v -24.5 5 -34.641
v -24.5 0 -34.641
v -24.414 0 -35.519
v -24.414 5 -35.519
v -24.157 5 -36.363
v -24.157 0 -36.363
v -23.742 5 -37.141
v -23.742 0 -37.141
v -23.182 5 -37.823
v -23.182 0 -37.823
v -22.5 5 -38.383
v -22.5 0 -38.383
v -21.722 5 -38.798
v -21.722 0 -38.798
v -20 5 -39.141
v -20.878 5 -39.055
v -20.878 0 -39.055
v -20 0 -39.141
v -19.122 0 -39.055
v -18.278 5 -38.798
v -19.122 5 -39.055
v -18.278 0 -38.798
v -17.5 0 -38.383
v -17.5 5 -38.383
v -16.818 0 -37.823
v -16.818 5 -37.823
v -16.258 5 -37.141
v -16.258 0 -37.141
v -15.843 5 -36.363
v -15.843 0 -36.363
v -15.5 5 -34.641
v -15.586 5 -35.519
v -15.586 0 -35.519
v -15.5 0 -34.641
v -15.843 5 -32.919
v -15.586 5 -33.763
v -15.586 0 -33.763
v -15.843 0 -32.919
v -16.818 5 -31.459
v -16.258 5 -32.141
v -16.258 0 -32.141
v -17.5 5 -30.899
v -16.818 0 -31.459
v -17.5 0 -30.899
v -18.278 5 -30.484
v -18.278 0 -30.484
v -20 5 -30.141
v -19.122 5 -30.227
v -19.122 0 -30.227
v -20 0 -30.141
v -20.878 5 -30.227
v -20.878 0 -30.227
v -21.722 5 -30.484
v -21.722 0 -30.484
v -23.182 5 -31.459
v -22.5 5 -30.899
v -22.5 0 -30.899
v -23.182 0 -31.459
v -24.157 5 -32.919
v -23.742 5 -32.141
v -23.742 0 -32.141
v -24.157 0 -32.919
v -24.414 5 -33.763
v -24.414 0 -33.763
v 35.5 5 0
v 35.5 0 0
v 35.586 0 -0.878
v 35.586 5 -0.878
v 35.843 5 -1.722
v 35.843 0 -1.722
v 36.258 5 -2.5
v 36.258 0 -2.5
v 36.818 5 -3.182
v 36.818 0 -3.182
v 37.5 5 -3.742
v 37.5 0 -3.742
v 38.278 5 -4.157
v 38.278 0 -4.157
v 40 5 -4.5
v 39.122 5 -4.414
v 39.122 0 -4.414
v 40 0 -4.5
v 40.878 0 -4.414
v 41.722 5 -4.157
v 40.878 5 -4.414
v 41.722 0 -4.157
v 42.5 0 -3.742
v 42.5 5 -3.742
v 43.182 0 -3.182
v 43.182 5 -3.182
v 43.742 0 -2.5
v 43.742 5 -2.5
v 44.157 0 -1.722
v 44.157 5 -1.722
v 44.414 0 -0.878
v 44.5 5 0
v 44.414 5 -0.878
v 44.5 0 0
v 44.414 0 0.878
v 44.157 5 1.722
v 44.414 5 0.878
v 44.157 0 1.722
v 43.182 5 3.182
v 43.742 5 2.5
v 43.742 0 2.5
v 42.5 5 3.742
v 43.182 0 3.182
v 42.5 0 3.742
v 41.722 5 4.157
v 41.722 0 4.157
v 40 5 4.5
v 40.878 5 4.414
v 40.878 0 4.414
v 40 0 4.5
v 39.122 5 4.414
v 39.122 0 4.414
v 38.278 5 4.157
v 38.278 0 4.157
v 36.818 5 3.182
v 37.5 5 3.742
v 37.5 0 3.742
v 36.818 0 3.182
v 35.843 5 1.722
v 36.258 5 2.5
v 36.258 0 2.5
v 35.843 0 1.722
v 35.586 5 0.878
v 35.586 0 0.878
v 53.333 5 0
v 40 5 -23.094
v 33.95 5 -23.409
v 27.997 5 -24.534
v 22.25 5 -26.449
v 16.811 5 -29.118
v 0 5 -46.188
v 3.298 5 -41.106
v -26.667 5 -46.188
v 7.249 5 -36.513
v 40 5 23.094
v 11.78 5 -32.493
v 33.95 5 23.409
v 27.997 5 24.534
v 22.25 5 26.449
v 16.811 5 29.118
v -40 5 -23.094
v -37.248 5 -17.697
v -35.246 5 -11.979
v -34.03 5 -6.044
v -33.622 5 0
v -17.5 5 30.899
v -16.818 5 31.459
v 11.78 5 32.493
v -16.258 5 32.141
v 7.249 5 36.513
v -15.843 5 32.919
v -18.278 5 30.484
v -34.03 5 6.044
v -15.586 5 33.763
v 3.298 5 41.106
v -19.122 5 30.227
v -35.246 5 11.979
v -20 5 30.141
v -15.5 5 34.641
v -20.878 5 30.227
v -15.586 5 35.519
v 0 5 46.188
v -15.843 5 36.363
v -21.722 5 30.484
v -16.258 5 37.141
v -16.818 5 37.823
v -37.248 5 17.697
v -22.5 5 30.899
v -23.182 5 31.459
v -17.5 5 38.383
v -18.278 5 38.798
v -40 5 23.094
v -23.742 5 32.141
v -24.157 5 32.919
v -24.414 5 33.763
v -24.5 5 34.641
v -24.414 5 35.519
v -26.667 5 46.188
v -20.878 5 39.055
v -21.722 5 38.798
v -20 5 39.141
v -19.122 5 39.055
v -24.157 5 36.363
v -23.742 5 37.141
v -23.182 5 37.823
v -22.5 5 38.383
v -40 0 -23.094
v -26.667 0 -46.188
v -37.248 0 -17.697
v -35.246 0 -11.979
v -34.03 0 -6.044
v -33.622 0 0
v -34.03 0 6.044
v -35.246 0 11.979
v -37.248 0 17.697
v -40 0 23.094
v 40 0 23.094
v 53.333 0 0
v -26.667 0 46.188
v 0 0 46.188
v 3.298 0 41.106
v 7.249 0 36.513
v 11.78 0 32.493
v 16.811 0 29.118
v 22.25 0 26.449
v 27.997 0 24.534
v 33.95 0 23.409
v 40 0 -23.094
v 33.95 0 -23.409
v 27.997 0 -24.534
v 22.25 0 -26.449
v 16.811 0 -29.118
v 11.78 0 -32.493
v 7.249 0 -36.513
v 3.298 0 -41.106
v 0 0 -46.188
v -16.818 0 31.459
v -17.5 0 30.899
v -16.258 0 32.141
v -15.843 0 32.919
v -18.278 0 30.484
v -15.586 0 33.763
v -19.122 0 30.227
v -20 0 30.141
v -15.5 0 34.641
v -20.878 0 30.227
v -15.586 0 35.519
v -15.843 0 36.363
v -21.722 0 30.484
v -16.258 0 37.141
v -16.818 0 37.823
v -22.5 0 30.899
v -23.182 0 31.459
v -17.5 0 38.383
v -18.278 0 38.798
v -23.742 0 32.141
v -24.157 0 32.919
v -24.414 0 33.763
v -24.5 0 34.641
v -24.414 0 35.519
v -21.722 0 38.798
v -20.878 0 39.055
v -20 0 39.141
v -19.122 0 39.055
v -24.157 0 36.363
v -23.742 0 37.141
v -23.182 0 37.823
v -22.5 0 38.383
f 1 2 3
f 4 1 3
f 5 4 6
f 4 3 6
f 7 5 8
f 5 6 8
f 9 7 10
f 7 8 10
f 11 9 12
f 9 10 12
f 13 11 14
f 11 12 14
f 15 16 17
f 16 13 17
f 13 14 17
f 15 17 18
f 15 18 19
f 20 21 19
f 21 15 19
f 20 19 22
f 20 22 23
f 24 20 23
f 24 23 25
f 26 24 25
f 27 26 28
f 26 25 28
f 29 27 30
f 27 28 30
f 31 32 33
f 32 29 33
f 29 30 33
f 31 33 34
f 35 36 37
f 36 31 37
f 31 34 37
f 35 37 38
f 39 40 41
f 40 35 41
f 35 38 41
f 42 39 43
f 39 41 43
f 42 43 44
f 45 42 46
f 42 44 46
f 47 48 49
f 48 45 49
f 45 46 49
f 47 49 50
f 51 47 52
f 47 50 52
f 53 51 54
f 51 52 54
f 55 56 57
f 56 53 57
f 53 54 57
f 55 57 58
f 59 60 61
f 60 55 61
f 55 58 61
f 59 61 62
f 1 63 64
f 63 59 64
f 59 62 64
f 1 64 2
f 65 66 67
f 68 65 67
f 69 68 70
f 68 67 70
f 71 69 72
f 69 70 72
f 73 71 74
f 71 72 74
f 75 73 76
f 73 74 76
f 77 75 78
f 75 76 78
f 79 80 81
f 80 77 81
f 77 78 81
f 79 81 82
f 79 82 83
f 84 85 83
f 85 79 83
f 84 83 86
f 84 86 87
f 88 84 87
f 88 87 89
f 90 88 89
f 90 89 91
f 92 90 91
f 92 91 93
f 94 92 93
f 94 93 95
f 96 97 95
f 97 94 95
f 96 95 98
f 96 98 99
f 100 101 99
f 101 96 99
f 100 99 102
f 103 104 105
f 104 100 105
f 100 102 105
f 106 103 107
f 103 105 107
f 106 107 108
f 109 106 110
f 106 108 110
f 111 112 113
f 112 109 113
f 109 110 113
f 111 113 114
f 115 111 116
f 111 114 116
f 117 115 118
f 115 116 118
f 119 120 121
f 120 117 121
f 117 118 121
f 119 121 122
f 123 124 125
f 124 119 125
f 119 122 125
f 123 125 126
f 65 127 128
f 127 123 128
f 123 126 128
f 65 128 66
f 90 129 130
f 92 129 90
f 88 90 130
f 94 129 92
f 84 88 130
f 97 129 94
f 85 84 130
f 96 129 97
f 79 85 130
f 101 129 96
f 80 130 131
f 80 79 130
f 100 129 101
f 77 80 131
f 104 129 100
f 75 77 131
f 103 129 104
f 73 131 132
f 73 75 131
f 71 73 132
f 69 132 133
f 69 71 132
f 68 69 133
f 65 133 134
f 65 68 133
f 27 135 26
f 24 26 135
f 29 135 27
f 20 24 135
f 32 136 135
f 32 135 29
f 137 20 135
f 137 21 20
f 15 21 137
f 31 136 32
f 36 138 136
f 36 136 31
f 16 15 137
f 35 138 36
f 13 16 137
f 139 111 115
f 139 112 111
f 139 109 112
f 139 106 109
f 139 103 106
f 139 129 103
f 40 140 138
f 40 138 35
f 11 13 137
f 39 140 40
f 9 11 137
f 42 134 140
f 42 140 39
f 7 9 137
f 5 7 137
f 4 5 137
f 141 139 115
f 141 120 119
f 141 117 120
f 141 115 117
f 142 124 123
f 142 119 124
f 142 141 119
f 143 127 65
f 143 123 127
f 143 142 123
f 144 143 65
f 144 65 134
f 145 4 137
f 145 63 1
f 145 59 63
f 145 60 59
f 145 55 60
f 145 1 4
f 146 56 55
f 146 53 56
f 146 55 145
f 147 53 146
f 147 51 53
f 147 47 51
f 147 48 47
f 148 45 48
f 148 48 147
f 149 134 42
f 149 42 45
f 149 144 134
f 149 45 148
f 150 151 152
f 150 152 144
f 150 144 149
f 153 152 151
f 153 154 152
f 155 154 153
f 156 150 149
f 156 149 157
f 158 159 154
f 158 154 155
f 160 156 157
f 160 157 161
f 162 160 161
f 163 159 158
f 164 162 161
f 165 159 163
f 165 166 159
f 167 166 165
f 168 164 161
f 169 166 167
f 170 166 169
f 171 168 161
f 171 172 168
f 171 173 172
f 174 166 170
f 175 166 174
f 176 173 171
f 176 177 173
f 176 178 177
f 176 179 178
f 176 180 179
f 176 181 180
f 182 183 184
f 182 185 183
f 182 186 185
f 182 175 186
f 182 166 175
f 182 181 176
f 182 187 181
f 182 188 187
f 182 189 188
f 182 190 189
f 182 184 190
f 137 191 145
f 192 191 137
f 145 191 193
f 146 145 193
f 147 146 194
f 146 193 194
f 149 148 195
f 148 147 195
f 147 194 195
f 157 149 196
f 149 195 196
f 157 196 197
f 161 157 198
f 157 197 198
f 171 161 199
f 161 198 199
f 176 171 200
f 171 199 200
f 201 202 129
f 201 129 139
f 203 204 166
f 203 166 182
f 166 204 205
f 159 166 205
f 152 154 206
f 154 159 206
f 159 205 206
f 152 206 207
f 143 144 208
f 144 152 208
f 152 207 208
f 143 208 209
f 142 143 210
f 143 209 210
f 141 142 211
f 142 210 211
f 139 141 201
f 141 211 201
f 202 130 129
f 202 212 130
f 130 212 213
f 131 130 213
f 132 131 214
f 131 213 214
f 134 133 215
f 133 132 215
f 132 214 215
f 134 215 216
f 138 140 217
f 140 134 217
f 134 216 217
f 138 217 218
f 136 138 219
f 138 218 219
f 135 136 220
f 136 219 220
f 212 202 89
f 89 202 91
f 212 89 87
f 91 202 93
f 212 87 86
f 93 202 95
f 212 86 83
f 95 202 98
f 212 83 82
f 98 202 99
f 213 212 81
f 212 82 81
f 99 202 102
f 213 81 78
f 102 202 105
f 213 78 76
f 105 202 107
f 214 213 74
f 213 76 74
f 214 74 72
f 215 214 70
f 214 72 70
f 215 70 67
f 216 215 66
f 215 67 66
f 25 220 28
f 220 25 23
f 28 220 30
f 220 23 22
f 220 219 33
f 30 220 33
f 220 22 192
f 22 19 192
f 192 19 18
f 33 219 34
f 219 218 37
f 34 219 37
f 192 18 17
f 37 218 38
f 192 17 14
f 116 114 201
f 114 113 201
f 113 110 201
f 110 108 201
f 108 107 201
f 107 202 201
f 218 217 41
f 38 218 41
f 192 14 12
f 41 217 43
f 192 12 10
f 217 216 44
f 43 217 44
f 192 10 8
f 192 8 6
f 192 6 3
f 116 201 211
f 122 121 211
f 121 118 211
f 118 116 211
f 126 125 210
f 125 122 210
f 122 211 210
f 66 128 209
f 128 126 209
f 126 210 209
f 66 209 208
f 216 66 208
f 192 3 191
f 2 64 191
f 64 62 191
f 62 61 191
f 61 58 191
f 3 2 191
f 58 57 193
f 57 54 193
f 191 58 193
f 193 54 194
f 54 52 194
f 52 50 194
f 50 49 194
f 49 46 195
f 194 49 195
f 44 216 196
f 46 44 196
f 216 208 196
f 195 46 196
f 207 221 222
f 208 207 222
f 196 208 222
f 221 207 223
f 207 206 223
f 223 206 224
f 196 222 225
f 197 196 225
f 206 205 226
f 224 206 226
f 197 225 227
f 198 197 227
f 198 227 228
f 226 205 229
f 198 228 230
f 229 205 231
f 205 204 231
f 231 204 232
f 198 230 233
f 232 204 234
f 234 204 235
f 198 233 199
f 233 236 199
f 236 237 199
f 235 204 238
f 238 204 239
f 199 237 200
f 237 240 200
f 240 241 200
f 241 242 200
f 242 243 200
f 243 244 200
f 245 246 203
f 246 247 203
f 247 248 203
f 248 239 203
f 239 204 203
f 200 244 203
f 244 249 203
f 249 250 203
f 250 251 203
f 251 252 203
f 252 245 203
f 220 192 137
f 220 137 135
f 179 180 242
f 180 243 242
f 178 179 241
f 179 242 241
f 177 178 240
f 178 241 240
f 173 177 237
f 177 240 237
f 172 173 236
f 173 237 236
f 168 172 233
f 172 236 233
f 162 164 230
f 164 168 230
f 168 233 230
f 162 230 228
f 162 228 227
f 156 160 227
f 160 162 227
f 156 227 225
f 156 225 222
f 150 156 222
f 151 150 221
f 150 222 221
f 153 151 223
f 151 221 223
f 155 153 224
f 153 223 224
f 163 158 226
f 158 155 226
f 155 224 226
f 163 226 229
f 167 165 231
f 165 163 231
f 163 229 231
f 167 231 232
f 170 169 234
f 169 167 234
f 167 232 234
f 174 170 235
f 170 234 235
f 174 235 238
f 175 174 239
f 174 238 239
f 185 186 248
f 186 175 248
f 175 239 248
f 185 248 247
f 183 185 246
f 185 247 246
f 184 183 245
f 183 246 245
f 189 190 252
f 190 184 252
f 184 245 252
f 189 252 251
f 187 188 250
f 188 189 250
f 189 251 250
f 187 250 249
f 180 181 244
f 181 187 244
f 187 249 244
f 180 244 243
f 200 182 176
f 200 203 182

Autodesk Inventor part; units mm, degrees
ref_plane "YZ Plane" through (0, 0, 0) normal (1, 0, 0) x (0, 1, 0)
ref_plane "XZ Plane" through (0, 0, 0) normal (0, 1, 0) x (-1, 0, 0)
ref_plane "XY Plane" through (0, 0, 0) normal (0, 0, 1) x (1, 0, 0)
sketch "Sketch1" plane through (0, 0, 0) normal (0, 1, 0) x (-1, 0, 0)
  circle A0 centre (-40, 0) radius 4.5
  circle A1 centre (20, -34.641) radius 4.5
  circle A2 centre (20, 34.641) radius 4.5
  line L0 (40, -23.094) -> (26.6667, -46.188)
  line L1 (26.6667, -46.188) -> (0, -46.188)
  line L2 (-40, -23.094) -> (-53.3333, 0)
  line L3 (-53.3333, 0) -> (-40, 23.094)
  line L4 (0, 46.188) -> (26.6667, 46.188)
  line L5 (26.6667, 46.188) -> (40, 23.094)
  arc A3 (-40, 23.094) -> (0, 46.188) centre (-39.3111, 68.0887) ccw
  arc A4 (0, -46.188) -> (-40, -23.094) centre (-39.3111, -68.0887) ccw
  arc A5 (40, 23.094) -> (40, -23.094) centre (78.6221, 0) ccw
  point P0 (0, 0)
  point P1 (0, 0)
  point P2 (0, 0)
  point P3 (0, 0)
  dimension "d1" = 9
  dimension "d2" = 9
  dimension "d3" = 9
  dimension "d4" = 45
  dimension "d5" = 45
  dimension "d6" = 45
extrude "Extrusion1" add sketch "Sketch1" along normal blind 5
properties part number "Palm1"
